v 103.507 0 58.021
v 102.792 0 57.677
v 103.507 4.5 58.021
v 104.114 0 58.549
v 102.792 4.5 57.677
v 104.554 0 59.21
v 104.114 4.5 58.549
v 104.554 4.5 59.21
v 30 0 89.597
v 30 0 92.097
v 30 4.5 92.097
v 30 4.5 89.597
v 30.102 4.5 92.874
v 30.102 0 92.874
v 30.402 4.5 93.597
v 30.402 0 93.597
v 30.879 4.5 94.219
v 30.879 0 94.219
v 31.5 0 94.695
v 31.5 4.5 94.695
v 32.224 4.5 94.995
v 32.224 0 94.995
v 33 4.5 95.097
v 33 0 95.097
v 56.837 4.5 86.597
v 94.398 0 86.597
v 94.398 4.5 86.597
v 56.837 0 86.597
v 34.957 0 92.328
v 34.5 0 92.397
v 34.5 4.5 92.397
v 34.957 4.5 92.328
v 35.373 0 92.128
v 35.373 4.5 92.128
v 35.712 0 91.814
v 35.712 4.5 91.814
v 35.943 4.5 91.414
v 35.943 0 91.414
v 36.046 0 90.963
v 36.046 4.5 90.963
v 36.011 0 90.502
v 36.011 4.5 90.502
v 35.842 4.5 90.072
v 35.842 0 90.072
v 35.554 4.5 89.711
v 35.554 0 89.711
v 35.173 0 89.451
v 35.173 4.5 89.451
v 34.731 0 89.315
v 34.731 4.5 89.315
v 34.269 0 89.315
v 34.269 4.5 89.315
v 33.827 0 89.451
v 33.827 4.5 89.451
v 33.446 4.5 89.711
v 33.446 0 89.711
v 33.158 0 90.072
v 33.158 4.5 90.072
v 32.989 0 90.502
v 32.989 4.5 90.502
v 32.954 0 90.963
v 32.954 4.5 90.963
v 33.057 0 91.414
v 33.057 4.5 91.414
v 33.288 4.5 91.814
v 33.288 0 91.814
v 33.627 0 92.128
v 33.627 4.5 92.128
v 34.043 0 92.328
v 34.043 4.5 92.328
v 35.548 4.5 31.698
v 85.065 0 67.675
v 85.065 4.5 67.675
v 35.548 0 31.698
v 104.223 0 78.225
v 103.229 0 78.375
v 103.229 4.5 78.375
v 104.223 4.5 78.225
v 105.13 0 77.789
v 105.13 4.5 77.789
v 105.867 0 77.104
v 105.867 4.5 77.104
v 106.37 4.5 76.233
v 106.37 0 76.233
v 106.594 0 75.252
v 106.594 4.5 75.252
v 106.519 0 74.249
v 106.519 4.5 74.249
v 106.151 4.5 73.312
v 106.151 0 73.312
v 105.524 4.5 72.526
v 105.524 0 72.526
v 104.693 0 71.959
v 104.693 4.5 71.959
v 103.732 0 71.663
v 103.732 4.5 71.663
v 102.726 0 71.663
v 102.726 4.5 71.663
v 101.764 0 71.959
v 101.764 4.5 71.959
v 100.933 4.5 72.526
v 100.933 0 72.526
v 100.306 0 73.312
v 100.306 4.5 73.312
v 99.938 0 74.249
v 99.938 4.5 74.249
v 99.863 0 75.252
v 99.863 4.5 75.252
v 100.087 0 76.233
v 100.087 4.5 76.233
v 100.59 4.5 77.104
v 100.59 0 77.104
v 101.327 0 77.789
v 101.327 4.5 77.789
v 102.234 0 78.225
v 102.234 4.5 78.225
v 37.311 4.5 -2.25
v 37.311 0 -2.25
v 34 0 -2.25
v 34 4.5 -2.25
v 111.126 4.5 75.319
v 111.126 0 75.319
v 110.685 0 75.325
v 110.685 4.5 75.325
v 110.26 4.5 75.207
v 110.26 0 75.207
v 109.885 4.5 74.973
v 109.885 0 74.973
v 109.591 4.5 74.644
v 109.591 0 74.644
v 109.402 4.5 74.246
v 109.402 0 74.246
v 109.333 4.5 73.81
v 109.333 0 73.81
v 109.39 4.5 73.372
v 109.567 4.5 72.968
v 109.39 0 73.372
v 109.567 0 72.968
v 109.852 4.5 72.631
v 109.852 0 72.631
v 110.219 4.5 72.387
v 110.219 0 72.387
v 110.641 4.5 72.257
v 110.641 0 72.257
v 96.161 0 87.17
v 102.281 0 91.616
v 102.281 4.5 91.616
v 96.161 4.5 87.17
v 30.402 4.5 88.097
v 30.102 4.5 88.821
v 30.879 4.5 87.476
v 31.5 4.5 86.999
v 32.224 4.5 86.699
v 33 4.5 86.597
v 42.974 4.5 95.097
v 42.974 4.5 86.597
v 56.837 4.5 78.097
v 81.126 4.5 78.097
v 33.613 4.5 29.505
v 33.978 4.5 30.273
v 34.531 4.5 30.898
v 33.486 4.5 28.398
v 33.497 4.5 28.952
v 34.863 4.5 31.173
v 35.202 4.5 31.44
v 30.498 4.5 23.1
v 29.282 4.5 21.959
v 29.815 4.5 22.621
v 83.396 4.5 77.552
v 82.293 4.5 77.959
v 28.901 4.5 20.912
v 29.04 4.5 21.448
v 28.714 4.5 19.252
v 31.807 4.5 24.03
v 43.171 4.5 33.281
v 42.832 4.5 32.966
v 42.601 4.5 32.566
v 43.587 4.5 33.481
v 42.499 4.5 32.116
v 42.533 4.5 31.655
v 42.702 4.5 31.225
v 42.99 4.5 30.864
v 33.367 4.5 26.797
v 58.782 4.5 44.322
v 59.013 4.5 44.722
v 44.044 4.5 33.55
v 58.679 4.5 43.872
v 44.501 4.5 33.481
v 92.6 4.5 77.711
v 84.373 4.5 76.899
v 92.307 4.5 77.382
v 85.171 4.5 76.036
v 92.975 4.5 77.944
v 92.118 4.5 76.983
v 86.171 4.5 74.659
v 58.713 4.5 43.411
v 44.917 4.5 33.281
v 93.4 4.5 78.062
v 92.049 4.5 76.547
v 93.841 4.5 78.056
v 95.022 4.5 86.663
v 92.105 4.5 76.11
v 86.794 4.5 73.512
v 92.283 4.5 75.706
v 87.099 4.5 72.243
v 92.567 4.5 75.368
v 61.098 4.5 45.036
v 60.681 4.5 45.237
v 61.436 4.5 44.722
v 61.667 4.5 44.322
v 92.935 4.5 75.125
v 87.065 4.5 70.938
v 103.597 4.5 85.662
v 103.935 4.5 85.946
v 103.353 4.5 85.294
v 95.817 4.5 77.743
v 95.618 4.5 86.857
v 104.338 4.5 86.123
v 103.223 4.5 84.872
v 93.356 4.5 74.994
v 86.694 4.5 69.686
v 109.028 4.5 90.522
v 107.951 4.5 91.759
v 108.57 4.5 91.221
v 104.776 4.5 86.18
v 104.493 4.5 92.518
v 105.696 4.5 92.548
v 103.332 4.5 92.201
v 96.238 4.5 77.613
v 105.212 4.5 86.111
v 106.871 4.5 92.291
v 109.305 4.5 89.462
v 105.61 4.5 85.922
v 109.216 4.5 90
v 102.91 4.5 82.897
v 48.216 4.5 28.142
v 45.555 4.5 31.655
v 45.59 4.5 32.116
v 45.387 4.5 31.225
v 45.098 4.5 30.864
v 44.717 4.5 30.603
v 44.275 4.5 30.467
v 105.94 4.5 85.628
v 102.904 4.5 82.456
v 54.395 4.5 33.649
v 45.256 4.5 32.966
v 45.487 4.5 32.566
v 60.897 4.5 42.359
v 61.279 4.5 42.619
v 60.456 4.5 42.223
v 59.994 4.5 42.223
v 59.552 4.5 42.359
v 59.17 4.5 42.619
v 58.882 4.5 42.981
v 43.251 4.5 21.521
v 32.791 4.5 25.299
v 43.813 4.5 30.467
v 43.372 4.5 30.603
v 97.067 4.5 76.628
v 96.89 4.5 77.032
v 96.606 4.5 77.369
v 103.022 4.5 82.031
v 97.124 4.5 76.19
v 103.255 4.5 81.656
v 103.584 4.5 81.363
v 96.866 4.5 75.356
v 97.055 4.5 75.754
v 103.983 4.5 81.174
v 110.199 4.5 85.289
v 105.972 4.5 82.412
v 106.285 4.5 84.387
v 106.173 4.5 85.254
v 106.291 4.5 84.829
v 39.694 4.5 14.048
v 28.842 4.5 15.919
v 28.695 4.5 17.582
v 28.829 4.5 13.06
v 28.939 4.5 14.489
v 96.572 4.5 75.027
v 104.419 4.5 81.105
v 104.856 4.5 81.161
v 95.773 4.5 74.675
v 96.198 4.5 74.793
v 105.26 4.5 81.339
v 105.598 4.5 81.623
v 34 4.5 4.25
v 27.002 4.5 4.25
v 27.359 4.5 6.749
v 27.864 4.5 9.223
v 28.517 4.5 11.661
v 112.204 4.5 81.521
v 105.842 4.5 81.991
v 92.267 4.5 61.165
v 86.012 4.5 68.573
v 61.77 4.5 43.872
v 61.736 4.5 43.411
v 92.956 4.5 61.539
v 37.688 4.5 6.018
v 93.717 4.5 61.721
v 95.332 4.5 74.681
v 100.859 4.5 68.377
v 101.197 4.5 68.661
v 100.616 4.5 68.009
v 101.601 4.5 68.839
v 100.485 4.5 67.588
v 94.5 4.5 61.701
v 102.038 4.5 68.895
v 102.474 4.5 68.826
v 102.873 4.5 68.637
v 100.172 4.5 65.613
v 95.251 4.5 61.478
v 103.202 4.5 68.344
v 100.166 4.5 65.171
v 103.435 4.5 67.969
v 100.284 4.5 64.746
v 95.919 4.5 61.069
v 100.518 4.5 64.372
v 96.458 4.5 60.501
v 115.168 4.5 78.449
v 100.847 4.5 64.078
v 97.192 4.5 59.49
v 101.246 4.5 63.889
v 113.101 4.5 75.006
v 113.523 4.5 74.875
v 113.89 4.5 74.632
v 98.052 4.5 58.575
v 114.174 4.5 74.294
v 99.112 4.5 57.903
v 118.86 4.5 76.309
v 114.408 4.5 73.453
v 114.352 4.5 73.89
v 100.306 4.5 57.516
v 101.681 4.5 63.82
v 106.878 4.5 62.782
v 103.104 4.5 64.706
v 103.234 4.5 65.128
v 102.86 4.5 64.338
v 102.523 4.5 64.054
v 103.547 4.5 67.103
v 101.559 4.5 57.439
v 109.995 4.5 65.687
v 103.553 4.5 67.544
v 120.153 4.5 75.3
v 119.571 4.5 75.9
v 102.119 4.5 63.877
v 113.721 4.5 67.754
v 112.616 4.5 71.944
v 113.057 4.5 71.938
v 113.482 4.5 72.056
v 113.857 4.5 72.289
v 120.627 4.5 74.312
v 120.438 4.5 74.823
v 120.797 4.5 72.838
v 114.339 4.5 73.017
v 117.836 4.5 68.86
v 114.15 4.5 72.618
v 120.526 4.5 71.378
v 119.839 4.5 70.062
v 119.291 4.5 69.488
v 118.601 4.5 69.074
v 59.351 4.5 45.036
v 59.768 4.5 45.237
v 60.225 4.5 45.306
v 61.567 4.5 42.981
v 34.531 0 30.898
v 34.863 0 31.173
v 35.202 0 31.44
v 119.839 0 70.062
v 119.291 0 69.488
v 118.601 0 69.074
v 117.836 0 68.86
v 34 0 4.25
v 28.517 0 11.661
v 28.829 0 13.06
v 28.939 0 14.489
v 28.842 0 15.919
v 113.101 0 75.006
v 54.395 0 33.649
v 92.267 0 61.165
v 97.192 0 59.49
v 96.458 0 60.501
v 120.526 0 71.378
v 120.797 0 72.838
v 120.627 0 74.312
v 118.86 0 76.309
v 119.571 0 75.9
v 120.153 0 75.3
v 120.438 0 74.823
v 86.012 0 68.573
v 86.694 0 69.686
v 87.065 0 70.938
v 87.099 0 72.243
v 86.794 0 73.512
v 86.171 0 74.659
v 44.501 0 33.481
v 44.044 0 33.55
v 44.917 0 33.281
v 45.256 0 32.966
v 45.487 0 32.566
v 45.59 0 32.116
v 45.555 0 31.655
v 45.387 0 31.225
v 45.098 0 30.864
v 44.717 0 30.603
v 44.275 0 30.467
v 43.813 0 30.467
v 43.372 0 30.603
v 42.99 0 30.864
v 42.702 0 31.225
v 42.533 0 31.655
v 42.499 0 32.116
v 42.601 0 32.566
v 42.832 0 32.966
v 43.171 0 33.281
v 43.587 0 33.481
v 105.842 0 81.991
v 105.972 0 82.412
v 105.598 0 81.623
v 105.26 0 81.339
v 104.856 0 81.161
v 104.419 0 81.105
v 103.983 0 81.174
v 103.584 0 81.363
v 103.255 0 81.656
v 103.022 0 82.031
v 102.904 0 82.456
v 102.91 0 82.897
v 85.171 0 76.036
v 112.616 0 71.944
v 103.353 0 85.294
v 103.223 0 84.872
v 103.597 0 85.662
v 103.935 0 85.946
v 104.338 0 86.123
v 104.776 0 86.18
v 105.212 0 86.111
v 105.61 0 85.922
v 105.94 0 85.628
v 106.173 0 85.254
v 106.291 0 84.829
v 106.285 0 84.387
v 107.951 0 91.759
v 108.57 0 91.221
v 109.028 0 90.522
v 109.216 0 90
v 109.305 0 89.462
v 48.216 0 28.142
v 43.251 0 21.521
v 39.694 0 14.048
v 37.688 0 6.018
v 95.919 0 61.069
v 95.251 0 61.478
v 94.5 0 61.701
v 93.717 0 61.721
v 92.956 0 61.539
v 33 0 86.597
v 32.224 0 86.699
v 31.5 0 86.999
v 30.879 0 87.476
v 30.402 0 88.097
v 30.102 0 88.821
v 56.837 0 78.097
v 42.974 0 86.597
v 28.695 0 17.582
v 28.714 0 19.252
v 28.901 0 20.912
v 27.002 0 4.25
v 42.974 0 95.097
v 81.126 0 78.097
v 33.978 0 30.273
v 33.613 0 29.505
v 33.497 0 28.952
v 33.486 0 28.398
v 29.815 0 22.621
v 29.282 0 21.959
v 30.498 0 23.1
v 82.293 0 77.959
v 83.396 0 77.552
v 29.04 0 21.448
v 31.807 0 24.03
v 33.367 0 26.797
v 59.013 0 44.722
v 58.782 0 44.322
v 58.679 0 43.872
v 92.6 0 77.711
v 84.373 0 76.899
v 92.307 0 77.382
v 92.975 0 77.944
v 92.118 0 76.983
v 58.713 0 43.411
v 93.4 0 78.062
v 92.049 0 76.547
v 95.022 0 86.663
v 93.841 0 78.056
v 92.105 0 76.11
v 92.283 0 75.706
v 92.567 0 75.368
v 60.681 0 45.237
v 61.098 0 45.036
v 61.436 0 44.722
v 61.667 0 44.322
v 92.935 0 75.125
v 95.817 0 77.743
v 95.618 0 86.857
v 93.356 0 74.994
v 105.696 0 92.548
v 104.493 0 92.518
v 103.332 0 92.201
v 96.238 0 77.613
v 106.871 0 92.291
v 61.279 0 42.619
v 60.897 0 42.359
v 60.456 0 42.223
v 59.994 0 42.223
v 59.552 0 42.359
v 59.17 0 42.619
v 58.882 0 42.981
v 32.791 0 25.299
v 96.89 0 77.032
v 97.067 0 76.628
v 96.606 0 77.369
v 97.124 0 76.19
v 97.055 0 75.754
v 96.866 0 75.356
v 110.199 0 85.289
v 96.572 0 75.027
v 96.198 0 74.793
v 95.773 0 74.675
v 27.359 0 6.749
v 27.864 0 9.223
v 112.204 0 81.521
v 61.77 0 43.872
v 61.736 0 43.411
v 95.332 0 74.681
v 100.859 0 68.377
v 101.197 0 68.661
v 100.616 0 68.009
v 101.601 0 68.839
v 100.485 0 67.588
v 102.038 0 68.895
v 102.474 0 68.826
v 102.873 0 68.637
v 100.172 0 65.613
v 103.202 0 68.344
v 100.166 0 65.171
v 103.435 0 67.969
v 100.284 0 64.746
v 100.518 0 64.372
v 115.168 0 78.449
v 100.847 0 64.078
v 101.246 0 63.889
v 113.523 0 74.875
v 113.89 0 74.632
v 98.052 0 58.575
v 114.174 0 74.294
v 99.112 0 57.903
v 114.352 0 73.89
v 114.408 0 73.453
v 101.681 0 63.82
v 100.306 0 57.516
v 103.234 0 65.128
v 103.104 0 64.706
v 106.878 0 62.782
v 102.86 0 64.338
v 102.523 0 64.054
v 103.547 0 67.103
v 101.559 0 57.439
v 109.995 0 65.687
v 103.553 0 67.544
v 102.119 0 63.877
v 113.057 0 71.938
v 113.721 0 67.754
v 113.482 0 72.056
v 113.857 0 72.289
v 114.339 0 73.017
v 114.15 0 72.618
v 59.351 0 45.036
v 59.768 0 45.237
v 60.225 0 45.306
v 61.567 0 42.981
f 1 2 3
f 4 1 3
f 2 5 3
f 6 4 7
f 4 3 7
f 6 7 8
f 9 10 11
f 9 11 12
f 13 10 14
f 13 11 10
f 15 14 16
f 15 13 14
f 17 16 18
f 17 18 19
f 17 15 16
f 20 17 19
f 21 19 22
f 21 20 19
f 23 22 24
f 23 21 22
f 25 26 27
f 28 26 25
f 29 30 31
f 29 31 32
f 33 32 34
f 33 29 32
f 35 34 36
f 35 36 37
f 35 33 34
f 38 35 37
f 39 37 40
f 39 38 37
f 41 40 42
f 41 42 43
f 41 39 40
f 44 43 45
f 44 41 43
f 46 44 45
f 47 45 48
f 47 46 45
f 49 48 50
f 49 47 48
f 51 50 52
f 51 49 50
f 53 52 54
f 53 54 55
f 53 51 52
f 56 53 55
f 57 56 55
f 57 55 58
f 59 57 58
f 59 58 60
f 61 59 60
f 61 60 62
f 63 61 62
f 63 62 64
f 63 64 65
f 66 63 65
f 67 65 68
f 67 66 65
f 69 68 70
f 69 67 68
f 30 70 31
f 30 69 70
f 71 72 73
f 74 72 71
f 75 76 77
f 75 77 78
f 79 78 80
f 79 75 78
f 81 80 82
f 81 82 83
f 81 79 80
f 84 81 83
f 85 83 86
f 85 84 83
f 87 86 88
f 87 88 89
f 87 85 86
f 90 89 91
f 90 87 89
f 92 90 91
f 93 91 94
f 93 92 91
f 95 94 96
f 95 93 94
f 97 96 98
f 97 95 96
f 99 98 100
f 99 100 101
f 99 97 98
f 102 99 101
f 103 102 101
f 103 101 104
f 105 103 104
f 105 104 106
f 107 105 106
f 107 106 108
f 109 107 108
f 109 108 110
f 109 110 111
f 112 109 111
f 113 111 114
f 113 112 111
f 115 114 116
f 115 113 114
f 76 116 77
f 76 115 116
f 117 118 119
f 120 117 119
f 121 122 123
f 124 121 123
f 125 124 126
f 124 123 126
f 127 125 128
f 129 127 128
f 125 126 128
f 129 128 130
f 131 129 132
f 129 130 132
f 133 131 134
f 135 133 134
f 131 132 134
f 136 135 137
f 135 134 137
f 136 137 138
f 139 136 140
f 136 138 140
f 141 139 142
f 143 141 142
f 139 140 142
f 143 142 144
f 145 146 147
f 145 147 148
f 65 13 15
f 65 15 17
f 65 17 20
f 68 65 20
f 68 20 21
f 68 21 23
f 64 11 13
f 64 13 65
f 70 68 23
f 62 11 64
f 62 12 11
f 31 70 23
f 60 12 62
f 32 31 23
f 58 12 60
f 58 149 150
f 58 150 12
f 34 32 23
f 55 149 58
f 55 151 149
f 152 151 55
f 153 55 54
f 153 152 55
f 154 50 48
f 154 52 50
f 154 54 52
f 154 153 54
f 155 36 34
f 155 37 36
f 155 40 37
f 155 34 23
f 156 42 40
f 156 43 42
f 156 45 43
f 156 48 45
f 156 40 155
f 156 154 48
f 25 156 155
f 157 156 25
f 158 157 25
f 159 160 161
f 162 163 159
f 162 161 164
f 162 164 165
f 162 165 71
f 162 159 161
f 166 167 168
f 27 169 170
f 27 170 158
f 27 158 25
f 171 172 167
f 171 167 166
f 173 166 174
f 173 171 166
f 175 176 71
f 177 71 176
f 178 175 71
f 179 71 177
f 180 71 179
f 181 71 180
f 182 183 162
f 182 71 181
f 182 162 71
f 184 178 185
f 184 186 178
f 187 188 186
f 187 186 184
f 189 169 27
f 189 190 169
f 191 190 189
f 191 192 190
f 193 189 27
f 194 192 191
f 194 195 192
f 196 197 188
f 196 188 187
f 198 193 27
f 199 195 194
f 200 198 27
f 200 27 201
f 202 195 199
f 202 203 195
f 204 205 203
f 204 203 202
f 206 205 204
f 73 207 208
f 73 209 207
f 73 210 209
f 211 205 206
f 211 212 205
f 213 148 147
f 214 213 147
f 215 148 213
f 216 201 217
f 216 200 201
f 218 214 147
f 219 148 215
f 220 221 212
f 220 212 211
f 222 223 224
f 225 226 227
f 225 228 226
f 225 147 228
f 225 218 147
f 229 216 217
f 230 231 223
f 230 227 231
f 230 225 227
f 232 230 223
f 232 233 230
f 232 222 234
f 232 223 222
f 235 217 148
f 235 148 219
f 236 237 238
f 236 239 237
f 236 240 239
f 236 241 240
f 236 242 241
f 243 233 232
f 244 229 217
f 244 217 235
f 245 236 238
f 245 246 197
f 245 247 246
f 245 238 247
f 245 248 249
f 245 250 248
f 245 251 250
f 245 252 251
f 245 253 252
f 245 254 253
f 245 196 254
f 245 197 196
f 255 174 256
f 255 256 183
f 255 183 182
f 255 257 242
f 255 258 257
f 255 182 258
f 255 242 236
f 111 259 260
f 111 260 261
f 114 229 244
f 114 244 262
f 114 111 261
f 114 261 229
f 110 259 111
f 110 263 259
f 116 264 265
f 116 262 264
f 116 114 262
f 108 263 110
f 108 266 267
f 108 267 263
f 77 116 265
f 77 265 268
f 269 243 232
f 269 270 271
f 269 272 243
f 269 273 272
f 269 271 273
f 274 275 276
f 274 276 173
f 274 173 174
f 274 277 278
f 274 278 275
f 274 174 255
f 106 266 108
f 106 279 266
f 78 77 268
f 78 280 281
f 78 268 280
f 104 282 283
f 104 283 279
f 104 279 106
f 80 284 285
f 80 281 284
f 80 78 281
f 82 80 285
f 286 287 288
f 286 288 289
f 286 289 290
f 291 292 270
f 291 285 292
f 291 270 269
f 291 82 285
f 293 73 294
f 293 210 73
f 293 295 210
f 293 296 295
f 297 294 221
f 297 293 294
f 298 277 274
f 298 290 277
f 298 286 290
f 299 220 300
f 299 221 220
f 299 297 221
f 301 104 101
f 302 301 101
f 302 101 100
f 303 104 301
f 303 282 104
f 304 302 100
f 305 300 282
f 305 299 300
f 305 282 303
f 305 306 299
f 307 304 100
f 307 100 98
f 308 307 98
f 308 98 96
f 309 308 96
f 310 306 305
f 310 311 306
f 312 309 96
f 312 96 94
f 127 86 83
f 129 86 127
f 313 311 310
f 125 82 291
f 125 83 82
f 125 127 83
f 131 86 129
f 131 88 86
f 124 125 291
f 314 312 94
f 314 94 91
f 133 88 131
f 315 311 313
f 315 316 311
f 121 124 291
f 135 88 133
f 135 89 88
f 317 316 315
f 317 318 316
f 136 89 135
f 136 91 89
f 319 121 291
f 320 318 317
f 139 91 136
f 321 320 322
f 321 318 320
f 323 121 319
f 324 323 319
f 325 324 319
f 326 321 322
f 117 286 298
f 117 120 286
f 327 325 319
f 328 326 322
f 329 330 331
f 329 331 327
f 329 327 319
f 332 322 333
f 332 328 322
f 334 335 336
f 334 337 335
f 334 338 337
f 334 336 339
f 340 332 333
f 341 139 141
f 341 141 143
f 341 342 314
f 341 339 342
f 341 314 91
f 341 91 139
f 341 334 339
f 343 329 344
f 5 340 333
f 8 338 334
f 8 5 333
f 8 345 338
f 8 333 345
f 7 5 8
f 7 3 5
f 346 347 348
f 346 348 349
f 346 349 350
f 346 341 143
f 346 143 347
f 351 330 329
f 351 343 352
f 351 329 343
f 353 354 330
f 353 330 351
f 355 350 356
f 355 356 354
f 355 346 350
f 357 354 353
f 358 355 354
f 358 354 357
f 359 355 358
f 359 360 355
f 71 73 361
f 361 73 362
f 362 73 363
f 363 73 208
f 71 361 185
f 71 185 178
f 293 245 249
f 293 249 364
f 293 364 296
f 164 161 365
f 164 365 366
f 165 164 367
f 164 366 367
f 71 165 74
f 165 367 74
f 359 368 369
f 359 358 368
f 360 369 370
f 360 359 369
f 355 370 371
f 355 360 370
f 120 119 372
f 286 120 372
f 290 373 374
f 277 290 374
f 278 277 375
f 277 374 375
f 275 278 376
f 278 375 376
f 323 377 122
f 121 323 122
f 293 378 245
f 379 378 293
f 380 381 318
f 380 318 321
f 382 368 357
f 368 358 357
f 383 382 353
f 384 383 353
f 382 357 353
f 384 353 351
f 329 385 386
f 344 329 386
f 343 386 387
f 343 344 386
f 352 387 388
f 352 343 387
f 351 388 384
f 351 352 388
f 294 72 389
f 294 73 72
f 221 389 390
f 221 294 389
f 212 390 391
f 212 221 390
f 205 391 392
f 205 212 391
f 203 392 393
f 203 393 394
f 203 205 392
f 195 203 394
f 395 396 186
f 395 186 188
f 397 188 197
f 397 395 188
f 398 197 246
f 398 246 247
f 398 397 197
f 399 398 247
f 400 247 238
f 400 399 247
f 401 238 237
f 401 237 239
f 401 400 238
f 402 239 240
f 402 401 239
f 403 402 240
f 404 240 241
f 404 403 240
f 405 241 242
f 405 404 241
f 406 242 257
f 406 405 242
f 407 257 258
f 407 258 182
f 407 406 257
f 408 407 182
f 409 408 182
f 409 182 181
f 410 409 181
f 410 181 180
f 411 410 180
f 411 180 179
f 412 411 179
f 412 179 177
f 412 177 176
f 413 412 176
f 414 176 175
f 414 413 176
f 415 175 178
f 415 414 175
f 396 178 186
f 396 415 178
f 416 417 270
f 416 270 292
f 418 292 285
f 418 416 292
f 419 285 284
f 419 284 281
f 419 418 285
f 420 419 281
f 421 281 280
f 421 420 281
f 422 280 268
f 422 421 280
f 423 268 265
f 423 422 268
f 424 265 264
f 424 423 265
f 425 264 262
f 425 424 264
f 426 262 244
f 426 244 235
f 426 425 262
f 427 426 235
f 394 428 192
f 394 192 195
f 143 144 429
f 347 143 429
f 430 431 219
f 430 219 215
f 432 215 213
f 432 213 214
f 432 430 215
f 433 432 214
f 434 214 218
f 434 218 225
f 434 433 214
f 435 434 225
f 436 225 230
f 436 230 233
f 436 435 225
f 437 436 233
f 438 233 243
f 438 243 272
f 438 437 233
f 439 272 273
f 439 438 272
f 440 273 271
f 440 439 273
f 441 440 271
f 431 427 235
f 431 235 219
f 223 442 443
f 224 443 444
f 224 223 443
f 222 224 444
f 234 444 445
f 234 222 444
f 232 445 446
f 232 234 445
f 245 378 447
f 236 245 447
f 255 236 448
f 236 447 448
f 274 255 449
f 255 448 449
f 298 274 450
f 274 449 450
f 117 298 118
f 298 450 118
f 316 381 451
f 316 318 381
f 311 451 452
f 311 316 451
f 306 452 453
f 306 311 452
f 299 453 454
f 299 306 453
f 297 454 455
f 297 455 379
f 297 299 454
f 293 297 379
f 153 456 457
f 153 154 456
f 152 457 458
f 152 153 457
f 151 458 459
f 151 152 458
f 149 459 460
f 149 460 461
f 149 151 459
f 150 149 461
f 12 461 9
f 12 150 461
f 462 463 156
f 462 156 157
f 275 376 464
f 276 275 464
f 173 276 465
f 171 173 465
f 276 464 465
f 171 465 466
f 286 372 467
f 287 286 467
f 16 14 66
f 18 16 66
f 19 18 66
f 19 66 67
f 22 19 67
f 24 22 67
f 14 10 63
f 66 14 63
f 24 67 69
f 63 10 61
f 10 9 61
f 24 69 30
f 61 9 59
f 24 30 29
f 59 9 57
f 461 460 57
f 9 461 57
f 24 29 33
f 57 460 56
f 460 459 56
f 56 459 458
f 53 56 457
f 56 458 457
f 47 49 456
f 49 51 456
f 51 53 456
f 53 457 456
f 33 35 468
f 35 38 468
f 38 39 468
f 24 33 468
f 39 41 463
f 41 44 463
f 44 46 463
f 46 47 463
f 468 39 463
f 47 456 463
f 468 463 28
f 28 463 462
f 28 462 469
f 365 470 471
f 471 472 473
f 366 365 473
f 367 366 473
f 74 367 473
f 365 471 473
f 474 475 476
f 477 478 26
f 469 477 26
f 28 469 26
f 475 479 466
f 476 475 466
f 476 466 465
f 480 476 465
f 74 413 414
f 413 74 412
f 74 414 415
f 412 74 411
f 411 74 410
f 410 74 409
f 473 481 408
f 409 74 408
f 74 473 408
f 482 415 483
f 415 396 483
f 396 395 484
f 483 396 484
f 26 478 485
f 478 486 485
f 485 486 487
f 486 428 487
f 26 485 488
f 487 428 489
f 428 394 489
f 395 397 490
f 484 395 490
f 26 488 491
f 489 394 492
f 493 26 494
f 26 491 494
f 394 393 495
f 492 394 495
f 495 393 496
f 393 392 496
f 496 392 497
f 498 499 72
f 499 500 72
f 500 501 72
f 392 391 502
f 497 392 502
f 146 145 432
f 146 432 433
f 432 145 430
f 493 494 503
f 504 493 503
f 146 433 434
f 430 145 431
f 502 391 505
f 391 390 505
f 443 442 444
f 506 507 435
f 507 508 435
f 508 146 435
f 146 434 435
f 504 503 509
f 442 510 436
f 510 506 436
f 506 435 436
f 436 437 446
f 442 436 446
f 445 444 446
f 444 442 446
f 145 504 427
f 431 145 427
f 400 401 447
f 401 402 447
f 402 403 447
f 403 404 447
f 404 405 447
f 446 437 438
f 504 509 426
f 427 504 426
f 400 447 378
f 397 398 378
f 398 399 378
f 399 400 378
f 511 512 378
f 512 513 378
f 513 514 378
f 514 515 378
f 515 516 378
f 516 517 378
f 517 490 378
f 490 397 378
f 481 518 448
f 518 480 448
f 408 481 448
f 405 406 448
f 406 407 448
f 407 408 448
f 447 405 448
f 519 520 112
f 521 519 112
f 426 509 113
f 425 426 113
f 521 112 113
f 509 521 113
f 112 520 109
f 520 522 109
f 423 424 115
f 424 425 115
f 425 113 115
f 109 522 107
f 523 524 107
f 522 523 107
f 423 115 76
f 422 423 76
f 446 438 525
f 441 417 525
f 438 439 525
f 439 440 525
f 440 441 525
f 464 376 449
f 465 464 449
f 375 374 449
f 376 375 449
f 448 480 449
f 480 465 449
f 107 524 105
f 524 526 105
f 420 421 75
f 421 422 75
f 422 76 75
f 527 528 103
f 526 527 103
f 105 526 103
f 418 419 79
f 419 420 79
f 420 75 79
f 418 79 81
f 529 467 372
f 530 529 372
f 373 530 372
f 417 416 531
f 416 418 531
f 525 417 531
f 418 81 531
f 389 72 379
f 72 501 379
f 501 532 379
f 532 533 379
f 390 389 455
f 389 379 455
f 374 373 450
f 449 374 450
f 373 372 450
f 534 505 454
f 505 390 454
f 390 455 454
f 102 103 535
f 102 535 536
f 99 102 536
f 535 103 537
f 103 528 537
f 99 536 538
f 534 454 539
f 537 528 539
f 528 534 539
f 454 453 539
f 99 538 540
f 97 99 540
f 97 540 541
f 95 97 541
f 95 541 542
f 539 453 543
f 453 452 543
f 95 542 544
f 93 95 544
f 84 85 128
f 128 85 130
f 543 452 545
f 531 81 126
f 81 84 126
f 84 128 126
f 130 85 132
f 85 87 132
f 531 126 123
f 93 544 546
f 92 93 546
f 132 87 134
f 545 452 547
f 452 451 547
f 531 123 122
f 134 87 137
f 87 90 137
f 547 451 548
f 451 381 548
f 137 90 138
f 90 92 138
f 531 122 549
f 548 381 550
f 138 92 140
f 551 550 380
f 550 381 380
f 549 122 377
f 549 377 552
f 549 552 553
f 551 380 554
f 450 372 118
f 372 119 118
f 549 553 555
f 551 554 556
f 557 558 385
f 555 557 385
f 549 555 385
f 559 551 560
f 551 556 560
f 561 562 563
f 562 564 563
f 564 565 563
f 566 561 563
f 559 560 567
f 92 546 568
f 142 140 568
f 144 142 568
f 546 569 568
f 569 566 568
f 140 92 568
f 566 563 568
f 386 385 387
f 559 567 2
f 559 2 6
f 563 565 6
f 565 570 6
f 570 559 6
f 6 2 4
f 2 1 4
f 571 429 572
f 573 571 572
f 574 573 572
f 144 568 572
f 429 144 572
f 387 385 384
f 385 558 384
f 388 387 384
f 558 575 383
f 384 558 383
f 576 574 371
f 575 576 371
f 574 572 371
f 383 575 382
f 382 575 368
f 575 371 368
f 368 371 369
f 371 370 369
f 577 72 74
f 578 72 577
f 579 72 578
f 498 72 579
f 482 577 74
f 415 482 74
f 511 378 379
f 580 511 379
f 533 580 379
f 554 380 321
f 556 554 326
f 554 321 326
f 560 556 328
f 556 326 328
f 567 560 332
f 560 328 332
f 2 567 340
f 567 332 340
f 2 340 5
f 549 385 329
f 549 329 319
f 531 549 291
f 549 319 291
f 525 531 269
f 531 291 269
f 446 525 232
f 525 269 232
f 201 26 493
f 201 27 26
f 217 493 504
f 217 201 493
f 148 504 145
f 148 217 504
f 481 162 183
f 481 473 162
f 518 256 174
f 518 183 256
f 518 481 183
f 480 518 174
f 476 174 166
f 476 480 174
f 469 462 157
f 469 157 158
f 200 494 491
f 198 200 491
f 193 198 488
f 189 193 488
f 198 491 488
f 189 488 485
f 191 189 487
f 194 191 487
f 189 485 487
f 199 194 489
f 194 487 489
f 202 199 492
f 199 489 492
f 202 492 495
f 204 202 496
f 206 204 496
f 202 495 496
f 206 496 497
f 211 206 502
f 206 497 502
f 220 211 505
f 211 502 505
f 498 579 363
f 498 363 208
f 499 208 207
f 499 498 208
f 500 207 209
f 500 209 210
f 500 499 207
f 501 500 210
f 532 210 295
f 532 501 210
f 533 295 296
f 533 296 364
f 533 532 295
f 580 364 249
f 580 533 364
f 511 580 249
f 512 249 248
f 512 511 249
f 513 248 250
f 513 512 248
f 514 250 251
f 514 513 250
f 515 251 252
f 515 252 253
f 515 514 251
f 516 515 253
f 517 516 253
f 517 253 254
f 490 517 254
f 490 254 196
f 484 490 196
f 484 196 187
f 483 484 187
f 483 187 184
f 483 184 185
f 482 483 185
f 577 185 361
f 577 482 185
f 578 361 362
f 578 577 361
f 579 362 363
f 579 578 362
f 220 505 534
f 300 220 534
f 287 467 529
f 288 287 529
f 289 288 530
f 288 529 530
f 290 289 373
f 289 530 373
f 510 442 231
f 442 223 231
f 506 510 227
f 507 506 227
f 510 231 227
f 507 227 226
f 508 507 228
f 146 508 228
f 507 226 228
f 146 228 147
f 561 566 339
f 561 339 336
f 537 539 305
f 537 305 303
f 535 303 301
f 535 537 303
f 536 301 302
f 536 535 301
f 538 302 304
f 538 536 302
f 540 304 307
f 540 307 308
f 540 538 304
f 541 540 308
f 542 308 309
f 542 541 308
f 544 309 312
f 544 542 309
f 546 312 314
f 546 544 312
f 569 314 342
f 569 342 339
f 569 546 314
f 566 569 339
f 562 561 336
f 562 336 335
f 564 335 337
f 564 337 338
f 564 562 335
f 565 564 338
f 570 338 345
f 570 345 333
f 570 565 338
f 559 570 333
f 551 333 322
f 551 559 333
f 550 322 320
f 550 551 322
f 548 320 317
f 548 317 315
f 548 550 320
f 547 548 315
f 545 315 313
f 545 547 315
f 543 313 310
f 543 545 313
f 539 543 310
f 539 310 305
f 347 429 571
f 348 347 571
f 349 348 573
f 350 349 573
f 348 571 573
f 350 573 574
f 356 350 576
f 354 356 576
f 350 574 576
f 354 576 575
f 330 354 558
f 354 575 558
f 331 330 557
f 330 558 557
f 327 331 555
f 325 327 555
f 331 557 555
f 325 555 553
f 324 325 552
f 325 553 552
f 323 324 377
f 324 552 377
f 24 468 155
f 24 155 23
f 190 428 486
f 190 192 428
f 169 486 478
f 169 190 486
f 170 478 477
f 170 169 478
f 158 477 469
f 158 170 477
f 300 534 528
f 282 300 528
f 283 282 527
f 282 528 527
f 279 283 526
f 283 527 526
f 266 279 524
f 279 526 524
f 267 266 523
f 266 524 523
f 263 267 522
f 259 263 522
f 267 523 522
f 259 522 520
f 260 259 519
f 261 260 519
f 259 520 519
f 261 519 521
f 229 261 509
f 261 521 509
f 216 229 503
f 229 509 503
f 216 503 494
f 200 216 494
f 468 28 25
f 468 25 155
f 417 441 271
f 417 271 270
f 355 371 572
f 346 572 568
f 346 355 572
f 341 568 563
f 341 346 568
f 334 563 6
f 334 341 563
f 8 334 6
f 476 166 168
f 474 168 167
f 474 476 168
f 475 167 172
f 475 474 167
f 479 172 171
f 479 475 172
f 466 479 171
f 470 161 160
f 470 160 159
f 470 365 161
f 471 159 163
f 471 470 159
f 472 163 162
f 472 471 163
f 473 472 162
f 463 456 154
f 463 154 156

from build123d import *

# Parameters (mm, degrees)
SKETCH_3_R             = 3.375
SKETCH_3_R_2           = 1.55
EXTRUDE_1_DEPTH        = 4.5
FILLET_1_R             = 5
CUT_EXTRUDE_2_REACH    = 155.806
FILLET_3_R             = 3
EXTRUDE_4428_DEPTH     = 4.5
SKETCH_7_R             = 5.5
CUT_EXTRUDE_4738_DEPTH = 154.806186932
FILLET_1_2_R           = 3


with BuildPart() as part:
    # 草图3 → 凸台-拉伸1 (new body)
    with BuildSketch(Plane(origin=(0, 0, 0), x_dir=(1, 0, 0), z_dir=(0, 1, 0))):
        with BuildLine():
            Line((41.131907973, -24.012757507), (94.694386062, -62.928175745))
            Line((94.694386062, -62.928175745), (100.131399646, -55.444768547))
            Line((100.131399646, -55.444768547), (122.783875489, -71.902755611))
            Line((122.783875489, -71.902755611), (106.325888424, -94.555231453))
            Line((106.325888424, -94.555231453), (95.372658906, -86.597244389))
            Line((95.372658906, -86.597244389), (56.836706291, -86.597244389))
            Line((56.836706291, -86.597244389), (42.973762785, -95.097244389))
            Line((42.973762785, -95.097244389), (30, -95.097244389))
            Line((30, -95.097244389), (30, -86.597244389))
            Line((30, -86.597244389), (42.973762785, -86.597244389))
            Line((42.973762785, -86.597244389), (56.836706291, -78.097244389))
            Line((56.836706291, -78.097244389), (83.673412582, -78.097244389))
            Line((83.673412582, -78.097244389), (89.110426166, -70.613837191))
            Line((89.110426166, -70.613837191), (35.547948076, -31.698418954))
            ThreePointArc((35.547948076, -31.698418954), (34.497097301, -25.063608282), (41.131907973, -24.012757507))
        make_face()
        with Locations(Location((103.228644035, -75, 0), (0, 0, 270))):
            Circle(SKETCH_3_R, mode=Mode.SUBTRACT)
        with Locations(Location((44.044221455, -32, 0), (0, 0, 270))):
            Circle(SKETCH_3_R_2, mode=Mode.SUBTRACT)
        with Locations(Location((60.224561343, -43.755705046, 0), (0, 0, 270))):
            Circle(SKETCH_3_R_2, mode=Mode.SUBTRACT)
        with Locations(Location((34.5, -90.847244389, 0), (0, 0, 270))):
            Circle(SKETCH_3_R_2, mode=Mode.SUBTRACT)
        with BuildLine():
            Line((110.640755254, -72.256715968), (112.616131935, -71.943847038))
            ThreePointArc((112.616131935, -71.943847038), (114.389522284, -73.232290545), (113.101078777, -75.005680894))
            Line((113.101078777, -75.005680894), (111.125702096, -75.318549824))
            ThreePointArc((111.125702096, -75.318549824), (109.352311747, -74.030106317), (110.640755254, -72.256715968))
        make_face(mode=Mode.SUBTRACT)
        with BuildLine():
            Line((103.547193859, -67.10294194), (103.234324929, -65.127565258))
            ThreePointArc((103.234324929, -65.127565258), (101.46093458, -63.839121751), (100.172491073, -65.6125121))
            Line((100.172491073, -65.6125121), (100.485360003, -67.587888781))
            ThreePointArc((100.485360003, -67.587888781), (102.258750352, -68.876332288), (103.547193859, -67.10294194))
        make_face(mode=Mode.SUBTRACT)
        with BuildLine():
            Line((95.816532817, -77.743284032), (93.841156135, -78.056152962))
            ThreePointArc((93.841156135, -78.056152962), (92.067765787, -76.767709455), (93.356209294, -74.994319106))
            Line((93.356209294, -74.994319106), (95.331585975, -74.681450176))
            ThreePointArc((95.331585975, -74.681450176), (97.104976324, -75.969893683), (95.816532817, -77.743284032))
        make_face(mode=Mode.SUBTRACT)
        with BuildLine():
            Line((102.910094211, -82.89705806), (103.222963142, -84.872434742))
            ThreePointArc((103.222963142, -84.872434742), (104.99635349, -86.160878249), (106.284796997, -84.3874879))
            Line((106.284796997, -84.3874879), (105.971928067, -82.412111219))
            ThreePointArc((105.971928067, -82.412111219), (104.198537719, -81.123667712), (102.910094211, -82.89705806))
        make_face(mode=Mode.SUBTRACT)
    extrude(amount=EXTRUDE_1_DEPTH)

    # Fillet 1
    fillet_1_edges = [part.edges().sort_by_distance(p)[0] for p in [
        (83.673412582, 2.25, 78.097244389),
        (89.110426166, 2.25, 70.613837191),
        (100.131399646, 2.25, 55.444768547),
        (122.783875489, 2.25, 71.902755611),
        (106.325888424, 2.25, 94.555231453),
    ]]
    fillet(fillet_1_edges, radius=FILLET_1_R)

    # 草图4 → 圆弧-美观2 (cut, up to next)
    with BuildSketch(Plane(origin=(0, 4.5, 0), x_dir=(1, 0, 0), z_dir=(0, 1, 0)), mode=Mode.PRIVATE) as cut_extrude_2_sk1:
        with BuildLine():
            ThreePointArc((118.738790517, -68.963829349), (109.994899962, -65.687047674), (104.176484618, -58.383694808))
            Line((104.176484618, -58.383694808), (118.738790517, -68.963829349))
        make_face()
    cut_extrude_2_tool1 = extrude(cut_extrude_2_sk1.sketch, amount=-CUT_EXTRUDE_2_REACH, mode=Mode.PRIVATE) & part.part
    # 草图4 → 圆弧-美观2 (cut, up to next)
    with BuildSketch(Plane(origin=(0, 4.5, 0), x_dir=(1, 0, 0), z_dir=(0, 1, 0)), mode=Mode.PRIVATE) as cut_extrude_2_sk2:
        with BuildLine():
            ThreePointArc((119.844949227, -75.947840583), (112.204348353, -81.521230905), (109.264814686, -90.510146481))
            Line((109.264814686, -90.510146481), (119.844949227, -75.947840583))
        make_face()
    cut_extrude_2_tool2 = extrude(cut_extrude_2_sk2.sketch, amount=-CUT_EXTRUDE_2_REACH, mode=Mode.PRIVATE) & part.part
    add(cut_extrude_2_tool1.solids().sort_by_distance((110.868828, 4.5, 64.48419))[0], mode=Mode.SUBTRACT)
    add(cut_extrude_2_tool2.solids().sort_by_distance((113.606622, 4.5, 82.540042))[0], mode=Mode.SUBTRACT)

    # 圆角-美观3
    fillet_3_edges = [part.edges().sort_by_distance(p)[0] for p in [
        (119.844949227, 2.25, 75.947840583),
        (109.264814686, 2.25, 90.510146481),
        (118.738790517, 2.25, 68.963829349),
        (104.176484618, 2.25, 58.383694808),
        (95.372658906, 2.25, 86.597244389),
        (30, 2.25, 95.097244389),
        (30, 2.25, 86.597244389),
        (94.694386062, 2.25, 62.928175745),
    ]]
    fillet(fillet_3_edges, radius=FILLET_3_R)

    # 草图5 → Extrude 4428 (add)
    with BuildSketch(Plane(origin=(0, 0, 0), x_dir=(1, 0, 0), z_dir=(0, 1, 0))):
        with BuildLine():
            Line((34, -4.25), (27.002484736, -4.25))
            ThreePointArc((27.002484736, -4.25), (27.592720055, -7.98965282), (28.516665153, -11.661124786))
            ThreePointArc((28.516665153, -11.661124786), (28.909483525, -13.772484831), (28.842431122, -15.919028912))
            ThreePointArc((28.842431122, -15.919028912), (30.008908493, -24.737793116), (35.547948076, -31.698418954))
            ThreePointArc((35.547948076, -31.698418954), (34.497097301, -25.063608282), (41.131907973, -24.012757507))
            Line((41.131907973, -24.012757507), (54.395000648, -33.648958388))
            ThreePointArc((54.395000648, -33.648958388), (41.285942601, -17.872891342), (37.310903062, 2.249999975))
            Line((37.310903062, 2.249999975), (34, 2.249999975))
            Line((34, 2.249999975), (34, -4.25))
        make_face()
    extrude(amount=EXTRUDE_4428_DEPTH)

    # 草图7 → Cut-Extrude 4738 (cut, through all)
    with BuildSketch(Plane(origin=(0, 0, 0), x_dir=(1, 0, 0), z_dir=(0, 1, 0))):
        with Locations((28, -28)):
            Circle(SKETCH_7_R)
    extrude(amount=CUT_EXTRUDE_4738_DEPTH, mode=Mode.SUBTRACT)

    # Fillet 1 2
    fillet_1_2_edges = [part.edges().sort_by_distance(p)[0] for p in [
        (33.239893047, 2.25, 29.671382916),
        (29.281526942, 2.25, 22.651384413),
    ]]
    fillet(fillet_1_2_edges, radius=FILLET_1_2_R)


solid = part.part
